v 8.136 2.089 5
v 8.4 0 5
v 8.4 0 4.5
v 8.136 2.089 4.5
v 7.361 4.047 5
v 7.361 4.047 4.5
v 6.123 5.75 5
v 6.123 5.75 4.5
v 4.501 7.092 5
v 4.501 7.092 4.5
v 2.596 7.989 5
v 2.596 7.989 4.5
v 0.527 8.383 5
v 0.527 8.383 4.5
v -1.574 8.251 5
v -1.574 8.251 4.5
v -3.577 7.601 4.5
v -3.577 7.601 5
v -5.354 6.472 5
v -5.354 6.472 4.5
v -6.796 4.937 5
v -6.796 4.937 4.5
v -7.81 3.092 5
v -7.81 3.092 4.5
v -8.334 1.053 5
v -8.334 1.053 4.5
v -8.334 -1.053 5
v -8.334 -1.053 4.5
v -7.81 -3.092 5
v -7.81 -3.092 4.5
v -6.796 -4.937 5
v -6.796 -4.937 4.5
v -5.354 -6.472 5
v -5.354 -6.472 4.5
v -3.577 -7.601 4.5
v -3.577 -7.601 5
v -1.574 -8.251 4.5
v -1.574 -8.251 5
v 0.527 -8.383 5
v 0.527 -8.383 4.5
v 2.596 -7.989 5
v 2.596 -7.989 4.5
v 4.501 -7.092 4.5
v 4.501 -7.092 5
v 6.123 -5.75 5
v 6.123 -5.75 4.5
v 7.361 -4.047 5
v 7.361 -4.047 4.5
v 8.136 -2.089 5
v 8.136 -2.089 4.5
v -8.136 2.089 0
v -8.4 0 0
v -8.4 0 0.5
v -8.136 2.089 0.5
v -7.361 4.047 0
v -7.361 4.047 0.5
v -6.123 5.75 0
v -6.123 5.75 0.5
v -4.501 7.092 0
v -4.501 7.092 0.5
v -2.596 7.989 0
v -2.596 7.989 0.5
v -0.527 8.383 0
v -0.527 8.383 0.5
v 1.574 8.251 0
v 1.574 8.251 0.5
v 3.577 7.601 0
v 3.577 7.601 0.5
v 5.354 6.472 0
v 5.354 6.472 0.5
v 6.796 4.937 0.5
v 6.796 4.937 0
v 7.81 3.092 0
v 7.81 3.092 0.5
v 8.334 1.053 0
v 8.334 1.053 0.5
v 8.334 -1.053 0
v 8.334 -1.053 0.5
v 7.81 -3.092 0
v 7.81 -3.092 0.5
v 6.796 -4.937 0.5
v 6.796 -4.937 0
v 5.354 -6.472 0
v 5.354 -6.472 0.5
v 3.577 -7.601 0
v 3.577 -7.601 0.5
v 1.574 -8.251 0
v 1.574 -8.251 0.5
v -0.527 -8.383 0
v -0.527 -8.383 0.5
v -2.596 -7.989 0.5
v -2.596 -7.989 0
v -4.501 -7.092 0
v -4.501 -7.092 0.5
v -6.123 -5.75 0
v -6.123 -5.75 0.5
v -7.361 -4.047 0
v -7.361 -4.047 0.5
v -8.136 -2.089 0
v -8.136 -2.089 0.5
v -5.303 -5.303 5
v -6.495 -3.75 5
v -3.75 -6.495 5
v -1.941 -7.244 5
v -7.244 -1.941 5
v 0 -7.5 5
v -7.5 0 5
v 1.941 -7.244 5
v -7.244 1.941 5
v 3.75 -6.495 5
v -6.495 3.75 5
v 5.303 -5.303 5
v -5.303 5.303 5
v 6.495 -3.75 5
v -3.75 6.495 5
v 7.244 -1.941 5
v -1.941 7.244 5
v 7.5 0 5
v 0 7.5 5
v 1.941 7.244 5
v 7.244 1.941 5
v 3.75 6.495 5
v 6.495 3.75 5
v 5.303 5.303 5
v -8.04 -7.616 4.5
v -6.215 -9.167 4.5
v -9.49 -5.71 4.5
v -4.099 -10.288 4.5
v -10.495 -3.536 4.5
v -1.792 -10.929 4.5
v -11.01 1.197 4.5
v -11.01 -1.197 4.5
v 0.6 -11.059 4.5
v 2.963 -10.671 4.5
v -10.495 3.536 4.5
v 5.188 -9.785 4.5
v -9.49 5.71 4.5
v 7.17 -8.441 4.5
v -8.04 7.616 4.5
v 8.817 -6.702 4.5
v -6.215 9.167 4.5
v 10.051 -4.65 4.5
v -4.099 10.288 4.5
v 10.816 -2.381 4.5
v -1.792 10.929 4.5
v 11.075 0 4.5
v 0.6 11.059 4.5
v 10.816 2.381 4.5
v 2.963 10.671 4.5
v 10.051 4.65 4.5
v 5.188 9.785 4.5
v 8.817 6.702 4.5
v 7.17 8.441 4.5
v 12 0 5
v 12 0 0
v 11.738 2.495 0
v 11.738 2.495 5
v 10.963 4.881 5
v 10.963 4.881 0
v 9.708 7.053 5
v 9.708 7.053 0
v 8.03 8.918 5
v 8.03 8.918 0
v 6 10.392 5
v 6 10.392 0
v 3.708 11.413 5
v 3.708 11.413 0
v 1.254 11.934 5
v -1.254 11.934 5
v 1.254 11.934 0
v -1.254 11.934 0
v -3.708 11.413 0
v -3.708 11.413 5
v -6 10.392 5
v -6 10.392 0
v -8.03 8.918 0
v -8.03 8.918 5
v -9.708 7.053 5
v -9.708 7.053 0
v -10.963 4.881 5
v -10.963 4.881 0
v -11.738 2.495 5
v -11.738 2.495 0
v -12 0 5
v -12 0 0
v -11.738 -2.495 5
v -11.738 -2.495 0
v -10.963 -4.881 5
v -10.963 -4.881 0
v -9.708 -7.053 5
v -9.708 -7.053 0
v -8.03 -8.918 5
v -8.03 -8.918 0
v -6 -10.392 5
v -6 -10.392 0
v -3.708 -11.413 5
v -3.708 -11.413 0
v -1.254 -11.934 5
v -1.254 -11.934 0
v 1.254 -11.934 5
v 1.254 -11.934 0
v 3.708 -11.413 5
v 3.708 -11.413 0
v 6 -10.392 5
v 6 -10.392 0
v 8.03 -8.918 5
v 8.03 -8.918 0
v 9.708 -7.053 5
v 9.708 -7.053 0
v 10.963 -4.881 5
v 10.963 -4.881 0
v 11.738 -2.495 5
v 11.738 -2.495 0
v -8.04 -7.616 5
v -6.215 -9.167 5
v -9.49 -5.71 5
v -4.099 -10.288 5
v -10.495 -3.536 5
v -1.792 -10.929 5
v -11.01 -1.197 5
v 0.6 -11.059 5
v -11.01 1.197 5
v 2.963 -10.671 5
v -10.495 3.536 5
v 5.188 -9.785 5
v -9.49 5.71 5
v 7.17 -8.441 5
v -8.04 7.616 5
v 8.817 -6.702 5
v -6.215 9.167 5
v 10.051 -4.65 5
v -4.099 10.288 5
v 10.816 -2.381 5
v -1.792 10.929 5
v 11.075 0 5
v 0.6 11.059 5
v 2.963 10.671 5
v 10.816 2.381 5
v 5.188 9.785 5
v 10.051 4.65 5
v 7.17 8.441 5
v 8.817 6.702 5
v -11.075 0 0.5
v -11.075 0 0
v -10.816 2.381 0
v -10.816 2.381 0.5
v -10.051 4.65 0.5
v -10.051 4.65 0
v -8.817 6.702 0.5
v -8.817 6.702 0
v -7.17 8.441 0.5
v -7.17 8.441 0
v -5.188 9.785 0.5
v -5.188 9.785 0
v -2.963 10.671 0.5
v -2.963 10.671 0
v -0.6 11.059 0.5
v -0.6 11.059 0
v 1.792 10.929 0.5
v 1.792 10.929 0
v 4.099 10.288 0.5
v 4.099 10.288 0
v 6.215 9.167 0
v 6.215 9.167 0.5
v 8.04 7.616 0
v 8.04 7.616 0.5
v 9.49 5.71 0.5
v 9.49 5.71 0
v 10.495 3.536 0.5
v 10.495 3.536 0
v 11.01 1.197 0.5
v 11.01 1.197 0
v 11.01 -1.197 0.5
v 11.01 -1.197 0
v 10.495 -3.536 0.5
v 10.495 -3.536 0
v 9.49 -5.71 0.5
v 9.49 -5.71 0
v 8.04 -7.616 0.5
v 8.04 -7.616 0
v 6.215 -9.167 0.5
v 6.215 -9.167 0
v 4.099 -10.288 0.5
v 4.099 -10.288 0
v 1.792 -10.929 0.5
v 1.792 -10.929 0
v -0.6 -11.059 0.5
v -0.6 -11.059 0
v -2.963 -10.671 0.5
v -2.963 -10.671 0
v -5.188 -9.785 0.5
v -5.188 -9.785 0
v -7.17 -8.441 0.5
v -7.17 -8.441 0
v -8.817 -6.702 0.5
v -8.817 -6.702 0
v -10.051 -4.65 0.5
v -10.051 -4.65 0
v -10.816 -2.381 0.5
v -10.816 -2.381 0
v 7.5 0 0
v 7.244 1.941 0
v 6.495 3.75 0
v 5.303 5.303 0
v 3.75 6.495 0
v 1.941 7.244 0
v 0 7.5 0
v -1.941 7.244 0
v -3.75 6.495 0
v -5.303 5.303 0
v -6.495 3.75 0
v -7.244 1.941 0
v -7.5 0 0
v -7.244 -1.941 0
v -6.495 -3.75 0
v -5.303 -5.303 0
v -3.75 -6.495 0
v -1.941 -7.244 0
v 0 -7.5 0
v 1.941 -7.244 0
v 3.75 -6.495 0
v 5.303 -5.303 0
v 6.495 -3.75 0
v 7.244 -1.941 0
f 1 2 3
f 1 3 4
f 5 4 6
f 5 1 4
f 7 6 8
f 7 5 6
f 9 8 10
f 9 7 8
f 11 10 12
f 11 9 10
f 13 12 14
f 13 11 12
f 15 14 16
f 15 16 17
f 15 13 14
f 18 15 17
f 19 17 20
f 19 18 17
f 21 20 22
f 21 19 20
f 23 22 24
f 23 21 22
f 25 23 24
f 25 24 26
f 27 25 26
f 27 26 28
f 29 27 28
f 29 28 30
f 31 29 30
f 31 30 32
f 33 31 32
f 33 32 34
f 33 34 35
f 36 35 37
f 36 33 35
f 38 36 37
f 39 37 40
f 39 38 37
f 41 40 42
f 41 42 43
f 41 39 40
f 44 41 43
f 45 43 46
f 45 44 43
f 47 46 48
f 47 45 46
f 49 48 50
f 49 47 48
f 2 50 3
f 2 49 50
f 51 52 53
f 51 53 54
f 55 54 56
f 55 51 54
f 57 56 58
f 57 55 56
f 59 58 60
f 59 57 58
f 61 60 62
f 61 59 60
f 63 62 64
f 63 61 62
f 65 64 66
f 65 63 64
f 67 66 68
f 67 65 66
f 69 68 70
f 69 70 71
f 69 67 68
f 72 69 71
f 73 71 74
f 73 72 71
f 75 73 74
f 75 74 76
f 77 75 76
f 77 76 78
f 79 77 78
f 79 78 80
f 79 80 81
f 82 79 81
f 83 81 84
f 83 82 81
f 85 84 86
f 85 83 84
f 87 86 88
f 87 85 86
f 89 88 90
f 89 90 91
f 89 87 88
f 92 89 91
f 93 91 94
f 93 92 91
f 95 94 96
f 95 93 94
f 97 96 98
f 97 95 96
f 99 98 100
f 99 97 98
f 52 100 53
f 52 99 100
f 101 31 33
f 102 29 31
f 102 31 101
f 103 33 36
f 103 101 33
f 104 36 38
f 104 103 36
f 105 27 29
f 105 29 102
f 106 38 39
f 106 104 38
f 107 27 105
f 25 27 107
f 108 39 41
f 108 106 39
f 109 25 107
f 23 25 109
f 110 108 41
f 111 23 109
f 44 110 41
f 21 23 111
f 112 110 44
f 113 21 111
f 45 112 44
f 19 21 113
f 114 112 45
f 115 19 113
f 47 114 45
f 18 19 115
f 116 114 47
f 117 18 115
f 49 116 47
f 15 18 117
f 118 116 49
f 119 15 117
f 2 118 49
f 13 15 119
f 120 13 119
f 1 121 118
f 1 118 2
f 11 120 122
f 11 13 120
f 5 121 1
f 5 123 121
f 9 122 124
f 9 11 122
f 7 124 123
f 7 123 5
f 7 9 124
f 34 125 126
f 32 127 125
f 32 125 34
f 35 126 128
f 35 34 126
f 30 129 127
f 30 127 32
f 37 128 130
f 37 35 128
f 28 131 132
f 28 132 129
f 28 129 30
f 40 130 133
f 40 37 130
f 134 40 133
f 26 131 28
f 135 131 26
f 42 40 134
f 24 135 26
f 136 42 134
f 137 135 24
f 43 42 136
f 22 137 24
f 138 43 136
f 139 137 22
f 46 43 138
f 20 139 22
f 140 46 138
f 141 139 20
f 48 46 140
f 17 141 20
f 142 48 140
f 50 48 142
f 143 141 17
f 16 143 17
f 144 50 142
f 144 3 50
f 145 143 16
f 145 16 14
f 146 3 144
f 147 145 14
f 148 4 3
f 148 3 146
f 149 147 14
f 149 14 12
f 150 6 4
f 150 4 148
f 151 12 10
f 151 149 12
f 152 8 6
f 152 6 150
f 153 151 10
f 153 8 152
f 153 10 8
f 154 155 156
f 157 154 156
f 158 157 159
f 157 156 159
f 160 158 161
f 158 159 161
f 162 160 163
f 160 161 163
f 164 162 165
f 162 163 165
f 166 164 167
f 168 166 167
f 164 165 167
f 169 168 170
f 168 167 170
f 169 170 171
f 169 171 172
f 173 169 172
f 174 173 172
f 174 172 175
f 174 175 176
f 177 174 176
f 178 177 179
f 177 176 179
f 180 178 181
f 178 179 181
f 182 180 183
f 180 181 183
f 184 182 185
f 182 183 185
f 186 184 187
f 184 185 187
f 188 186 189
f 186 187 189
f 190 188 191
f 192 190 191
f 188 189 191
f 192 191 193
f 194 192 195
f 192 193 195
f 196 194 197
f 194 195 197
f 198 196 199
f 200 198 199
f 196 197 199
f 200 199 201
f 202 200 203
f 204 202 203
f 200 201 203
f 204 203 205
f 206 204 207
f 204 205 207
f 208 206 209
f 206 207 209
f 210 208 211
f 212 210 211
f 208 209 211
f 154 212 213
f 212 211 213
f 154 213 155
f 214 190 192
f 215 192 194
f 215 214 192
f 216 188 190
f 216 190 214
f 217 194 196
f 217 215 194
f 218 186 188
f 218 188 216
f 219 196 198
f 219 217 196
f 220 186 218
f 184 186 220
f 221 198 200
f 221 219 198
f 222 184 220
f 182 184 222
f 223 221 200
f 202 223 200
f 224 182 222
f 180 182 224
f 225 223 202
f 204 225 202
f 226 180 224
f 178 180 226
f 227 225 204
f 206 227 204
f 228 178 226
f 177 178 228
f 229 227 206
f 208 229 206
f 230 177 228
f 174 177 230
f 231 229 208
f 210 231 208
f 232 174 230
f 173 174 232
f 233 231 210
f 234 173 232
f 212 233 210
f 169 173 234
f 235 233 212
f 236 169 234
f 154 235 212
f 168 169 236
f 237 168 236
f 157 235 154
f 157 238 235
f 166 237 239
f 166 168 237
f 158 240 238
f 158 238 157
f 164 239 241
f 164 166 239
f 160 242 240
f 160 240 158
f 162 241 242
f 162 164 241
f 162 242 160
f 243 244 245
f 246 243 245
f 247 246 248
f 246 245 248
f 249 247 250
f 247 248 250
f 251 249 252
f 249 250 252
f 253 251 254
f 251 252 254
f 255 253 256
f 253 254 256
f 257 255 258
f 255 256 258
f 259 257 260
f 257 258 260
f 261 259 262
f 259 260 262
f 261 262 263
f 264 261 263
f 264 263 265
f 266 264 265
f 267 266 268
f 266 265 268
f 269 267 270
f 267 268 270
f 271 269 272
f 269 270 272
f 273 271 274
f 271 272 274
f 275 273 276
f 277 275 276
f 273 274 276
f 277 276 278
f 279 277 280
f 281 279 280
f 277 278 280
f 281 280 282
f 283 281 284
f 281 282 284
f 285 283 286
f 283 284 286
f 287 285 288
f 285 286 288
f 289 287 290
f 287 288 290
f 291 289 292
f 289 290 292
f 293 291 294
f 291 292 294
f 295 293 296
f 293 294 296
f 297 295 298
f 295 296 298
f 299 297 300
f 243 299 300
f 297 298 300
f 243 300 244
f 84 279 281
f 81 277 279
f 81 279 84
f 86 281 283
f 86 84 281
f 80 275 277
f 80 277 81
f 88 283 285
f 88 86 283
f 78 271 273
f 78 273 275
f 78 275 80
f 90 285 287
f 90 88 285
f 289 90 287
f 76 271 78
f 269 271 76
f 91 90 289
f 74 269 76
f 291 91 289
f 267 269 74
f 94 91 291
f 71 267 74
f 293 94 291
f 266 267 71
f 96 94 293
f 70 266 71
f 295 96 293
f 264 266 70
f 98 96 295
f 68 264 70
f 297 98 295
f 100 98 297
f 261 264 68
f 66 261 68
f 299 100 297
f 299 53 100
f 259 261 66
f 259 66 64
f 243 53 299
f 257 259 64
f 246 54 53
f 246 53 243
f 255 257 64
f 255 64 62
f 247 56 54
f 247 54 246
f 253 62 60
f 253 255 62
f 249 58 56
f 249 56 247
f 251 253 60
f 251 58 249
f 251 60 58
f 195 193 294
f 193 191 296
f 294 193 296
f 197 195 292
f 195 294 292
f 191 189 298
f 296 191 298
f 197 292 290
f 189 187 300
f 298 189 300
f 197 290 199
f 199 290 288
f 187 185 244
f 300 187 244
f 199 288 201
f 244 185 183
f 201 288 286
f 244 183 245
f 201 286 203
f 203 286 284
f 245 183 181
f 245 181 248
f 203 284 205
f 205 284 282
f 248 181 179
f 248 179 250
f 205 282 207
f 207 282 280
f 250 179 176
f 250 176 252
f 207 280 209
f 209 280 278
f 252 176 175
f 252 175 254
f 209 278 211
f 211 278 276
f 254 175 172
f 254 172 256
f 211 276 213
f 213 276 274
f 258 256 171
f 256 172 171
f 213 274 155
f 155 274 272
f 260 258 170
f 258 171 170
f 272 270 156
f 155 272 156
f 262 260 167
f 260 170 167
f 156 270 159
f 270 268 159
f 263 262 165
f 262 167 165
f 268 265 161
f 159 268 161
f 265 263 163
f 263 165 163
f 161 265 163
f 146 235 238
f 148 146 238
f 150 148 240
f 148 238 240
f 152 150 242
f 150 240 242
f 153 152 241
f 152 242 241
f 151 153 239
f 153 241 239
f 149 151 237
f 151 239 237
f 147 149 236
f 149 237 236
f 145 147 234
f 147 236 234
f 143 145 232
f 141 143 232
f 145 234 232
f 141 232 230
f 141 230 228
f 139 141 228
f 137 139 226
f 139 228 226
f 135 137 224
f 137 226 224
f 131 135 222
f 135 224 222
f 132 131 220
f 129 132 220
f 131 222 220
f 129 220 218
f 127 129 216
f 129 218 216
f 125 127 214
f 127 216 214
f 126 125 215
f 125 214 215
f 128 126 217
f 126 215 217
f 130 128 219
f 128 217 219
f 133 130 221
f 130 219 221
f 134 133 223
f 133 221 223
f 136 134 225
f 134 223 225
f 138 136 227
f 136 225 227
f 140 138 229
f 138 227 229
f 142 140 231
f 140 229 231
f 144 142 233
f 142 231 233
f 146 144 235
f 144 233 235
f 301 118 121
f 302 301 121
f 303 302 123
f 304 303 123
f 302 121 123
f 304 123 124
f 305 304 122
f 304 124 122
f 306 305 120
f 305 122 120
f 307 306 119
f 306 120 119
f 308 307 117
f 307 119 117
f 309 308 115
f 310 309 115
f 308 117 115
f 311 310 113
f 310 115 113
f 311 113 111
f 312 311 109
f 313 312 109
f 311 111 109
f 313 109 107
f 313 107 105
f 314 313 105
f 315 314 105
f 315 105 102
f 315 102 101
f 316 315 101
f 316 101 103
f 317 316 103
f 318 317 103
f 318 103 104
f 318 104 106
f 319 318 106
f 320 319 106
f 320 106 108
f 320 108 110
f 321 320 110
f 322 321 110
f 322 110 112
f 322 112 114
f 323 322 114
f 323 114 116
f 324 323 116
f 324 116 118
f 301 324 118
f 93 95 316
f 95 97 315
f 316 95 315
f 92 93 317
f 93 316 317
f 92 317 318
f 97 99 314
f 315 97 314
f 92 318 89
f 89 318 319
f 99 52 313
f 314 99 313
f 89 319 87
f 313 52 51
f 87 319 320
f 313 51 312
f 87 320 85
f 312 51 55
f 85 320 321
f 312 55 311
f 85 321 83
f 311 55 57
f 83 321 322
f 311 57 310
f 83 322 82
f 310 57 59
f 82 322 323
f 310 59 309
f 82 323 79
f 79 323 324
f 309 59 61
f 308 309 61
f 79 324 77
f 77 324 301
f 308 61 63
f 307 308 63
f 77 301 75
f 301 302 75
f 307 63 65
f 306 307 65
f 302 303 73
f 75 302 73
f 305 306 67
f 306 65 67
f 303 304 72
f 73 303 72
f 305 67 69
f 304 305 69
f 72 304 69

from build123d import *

# Parameters (mm, degrees)
SKETCH_1_R          = 12
EXTRUDE_1_DEPTH     = 5
SKETCH_2_R          = 7.5
CUT_EXTRUDE_1_DEPTH = 6
SKETCH_3_R          = 11.075
SKETCH_3_R_2        = 8.4
CUT_EXTRUDE_2_DEPTH = 0.5
SKETCH_4_R          = 11.075
SKETCH_4_R_2        = 8.4
CUT_EXTRUDE_3_DEPTH = 0.5


with BuildPart() as part:
    # 草圖1 → 填料-伸長1 (new body)
    with BuildSketch(Plane.XY):
        Circle(SKETCH_1_R)
    extrude(amount=EXTRUDE_1_DEPTH)

    # 草圖2 → 除料-伸長1 (cut, through all)
    with BuildSketch(Plane.XY.offset(5)):
        Circle(SKETCH_2_R)
    extrude(amount=-CUT_EXTRUDE_1_DEPTH, mode=Mode.SUBTRACT)

    # 草圖3 → 除料-伸長2 (cut)
    with BuildSketch(Plane.XY.offset(5)):
        Circle(SKETCH_3_R)
        Circle(SKETCH_3_R_2, mode=Mode.SUBTRACT)
    extrude(amount=-CUT_EXTRUDE_2_DEPTH, mode=Mode.SUBTRACT)

    # 草圖4 → 除料-伸長3 (cut)
    with BuildSketch(Plane(origin=(0, 0, 0), x_dir=(-1, 0, 0), z_dir=(0, 0, -1))):
        Circle(SKETCH_4_R)
        Circle(SKETCH_4_R_2, mode=Mode.SUBTRACT)
    extrude(amount=-CUT_EXTRUDE_3_DEPTH, mode=Mode.SUBTRACT)


solid = part.part
